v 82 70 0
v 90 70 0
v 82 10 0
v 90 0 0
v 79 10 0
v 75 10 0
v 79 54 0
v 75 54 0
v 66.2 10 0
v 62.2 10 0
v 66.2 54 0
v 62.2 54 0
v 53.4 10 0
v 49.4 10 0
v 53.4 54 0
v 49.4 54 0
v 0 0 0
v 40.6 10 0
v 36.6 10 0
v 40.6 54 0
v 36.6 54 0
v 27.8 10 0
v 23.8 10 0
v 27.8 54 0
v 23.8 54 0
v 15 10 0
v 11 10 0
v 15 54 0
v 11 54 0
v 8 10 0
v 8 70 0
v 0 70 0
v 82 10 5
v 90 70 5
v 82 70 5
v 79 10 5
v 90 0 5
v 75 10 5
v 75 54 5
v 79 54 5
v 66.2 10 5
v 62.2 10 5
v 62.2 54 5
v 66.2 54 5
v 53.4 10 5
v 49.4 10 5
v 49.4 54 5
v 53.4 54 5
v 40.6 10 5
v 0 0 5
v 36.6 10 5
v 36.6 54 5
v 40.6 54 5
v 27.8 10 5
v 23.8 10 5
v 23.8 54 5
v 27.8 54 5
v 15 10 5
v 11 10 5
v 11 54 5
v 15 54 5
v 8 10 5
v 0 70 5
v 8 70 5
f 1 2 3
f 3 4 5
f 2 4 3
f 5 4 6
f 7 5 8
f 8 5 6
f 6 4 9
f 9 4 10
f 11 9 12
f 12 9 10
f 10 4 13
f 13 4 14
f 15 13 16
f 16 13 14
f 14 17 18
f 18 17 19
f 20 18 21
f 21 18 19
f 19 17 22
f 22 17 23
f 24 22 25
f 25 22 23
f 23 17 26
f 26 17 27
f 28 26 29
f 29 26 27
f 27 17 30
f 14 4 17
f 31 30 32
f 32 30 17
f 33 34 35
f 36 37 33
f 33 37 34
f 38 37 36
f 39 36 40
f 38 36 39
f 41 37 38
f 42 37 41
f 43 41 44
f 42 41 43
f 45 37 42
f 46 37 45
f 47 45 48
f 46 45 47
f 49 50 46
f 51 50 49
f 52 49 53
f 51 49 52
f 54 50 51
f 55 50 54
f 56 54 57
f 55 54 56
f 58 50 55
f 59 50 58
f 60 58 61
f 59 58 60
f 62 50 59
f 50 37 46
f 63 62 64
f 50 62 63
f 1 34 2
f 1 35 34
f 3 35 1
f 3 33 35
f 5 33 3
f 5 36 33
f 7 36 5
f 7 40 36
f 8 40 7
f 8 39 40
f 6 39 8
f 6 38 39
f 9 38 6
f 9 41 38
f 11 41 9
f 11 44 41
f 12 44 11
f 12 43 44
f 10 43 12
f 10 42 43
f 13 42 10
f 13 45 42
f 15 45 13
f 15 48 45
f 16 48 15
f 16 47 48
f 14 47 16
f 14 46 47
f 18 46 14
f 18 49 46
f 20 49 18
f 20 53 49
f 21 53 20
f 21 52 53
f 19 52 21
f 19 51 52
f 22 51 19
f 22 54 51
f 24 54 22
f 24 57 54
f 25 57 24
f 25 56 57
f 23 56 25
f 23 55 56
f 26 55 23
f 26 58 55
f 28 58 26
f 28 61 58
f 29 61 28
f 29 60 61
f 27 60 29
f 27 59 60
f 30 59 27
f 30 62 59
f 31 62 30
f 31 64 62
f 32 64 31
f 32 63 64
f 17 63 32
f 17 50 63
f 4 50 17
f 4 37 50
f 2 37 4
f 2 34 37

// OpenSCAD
$fn = 32;

// ----------------------------------------------------------------------
// Guard grille: 6 slats over a 90 x 70 mm plate
// ----------------------------------------------------------------------

// --- parameters (mm) ---
profile_height = 5;       // extrusion height
profile_points = 32;      // points of the closed outline

profile = [[0, 0], [90, 0], [90, 70], [82, 70], [82, 10], [79, 10], [79, 54], [75, 54], [75, 10], [66.2, 10], [66.2, 54], [62.2, 54], [62.2, 10], [53.4, 10], [53.4, 54], [49.4, 54], [49.4, 10], [40.6, 10], [40.6, 54], [36.6, 54], [36.6, 10], [27.8, 10], [27.8, 54], [23.8, 54], [23.8, 10], [15, 10], [15, 54], [11, 54], [11, 10], [8, 10], [8, 70], [0, 70]];  // single closed polygon, 32 points, counter clockwise

// --- the one profile operation ---
linear_extrude(height = profile_height) polygon(points = profile);
